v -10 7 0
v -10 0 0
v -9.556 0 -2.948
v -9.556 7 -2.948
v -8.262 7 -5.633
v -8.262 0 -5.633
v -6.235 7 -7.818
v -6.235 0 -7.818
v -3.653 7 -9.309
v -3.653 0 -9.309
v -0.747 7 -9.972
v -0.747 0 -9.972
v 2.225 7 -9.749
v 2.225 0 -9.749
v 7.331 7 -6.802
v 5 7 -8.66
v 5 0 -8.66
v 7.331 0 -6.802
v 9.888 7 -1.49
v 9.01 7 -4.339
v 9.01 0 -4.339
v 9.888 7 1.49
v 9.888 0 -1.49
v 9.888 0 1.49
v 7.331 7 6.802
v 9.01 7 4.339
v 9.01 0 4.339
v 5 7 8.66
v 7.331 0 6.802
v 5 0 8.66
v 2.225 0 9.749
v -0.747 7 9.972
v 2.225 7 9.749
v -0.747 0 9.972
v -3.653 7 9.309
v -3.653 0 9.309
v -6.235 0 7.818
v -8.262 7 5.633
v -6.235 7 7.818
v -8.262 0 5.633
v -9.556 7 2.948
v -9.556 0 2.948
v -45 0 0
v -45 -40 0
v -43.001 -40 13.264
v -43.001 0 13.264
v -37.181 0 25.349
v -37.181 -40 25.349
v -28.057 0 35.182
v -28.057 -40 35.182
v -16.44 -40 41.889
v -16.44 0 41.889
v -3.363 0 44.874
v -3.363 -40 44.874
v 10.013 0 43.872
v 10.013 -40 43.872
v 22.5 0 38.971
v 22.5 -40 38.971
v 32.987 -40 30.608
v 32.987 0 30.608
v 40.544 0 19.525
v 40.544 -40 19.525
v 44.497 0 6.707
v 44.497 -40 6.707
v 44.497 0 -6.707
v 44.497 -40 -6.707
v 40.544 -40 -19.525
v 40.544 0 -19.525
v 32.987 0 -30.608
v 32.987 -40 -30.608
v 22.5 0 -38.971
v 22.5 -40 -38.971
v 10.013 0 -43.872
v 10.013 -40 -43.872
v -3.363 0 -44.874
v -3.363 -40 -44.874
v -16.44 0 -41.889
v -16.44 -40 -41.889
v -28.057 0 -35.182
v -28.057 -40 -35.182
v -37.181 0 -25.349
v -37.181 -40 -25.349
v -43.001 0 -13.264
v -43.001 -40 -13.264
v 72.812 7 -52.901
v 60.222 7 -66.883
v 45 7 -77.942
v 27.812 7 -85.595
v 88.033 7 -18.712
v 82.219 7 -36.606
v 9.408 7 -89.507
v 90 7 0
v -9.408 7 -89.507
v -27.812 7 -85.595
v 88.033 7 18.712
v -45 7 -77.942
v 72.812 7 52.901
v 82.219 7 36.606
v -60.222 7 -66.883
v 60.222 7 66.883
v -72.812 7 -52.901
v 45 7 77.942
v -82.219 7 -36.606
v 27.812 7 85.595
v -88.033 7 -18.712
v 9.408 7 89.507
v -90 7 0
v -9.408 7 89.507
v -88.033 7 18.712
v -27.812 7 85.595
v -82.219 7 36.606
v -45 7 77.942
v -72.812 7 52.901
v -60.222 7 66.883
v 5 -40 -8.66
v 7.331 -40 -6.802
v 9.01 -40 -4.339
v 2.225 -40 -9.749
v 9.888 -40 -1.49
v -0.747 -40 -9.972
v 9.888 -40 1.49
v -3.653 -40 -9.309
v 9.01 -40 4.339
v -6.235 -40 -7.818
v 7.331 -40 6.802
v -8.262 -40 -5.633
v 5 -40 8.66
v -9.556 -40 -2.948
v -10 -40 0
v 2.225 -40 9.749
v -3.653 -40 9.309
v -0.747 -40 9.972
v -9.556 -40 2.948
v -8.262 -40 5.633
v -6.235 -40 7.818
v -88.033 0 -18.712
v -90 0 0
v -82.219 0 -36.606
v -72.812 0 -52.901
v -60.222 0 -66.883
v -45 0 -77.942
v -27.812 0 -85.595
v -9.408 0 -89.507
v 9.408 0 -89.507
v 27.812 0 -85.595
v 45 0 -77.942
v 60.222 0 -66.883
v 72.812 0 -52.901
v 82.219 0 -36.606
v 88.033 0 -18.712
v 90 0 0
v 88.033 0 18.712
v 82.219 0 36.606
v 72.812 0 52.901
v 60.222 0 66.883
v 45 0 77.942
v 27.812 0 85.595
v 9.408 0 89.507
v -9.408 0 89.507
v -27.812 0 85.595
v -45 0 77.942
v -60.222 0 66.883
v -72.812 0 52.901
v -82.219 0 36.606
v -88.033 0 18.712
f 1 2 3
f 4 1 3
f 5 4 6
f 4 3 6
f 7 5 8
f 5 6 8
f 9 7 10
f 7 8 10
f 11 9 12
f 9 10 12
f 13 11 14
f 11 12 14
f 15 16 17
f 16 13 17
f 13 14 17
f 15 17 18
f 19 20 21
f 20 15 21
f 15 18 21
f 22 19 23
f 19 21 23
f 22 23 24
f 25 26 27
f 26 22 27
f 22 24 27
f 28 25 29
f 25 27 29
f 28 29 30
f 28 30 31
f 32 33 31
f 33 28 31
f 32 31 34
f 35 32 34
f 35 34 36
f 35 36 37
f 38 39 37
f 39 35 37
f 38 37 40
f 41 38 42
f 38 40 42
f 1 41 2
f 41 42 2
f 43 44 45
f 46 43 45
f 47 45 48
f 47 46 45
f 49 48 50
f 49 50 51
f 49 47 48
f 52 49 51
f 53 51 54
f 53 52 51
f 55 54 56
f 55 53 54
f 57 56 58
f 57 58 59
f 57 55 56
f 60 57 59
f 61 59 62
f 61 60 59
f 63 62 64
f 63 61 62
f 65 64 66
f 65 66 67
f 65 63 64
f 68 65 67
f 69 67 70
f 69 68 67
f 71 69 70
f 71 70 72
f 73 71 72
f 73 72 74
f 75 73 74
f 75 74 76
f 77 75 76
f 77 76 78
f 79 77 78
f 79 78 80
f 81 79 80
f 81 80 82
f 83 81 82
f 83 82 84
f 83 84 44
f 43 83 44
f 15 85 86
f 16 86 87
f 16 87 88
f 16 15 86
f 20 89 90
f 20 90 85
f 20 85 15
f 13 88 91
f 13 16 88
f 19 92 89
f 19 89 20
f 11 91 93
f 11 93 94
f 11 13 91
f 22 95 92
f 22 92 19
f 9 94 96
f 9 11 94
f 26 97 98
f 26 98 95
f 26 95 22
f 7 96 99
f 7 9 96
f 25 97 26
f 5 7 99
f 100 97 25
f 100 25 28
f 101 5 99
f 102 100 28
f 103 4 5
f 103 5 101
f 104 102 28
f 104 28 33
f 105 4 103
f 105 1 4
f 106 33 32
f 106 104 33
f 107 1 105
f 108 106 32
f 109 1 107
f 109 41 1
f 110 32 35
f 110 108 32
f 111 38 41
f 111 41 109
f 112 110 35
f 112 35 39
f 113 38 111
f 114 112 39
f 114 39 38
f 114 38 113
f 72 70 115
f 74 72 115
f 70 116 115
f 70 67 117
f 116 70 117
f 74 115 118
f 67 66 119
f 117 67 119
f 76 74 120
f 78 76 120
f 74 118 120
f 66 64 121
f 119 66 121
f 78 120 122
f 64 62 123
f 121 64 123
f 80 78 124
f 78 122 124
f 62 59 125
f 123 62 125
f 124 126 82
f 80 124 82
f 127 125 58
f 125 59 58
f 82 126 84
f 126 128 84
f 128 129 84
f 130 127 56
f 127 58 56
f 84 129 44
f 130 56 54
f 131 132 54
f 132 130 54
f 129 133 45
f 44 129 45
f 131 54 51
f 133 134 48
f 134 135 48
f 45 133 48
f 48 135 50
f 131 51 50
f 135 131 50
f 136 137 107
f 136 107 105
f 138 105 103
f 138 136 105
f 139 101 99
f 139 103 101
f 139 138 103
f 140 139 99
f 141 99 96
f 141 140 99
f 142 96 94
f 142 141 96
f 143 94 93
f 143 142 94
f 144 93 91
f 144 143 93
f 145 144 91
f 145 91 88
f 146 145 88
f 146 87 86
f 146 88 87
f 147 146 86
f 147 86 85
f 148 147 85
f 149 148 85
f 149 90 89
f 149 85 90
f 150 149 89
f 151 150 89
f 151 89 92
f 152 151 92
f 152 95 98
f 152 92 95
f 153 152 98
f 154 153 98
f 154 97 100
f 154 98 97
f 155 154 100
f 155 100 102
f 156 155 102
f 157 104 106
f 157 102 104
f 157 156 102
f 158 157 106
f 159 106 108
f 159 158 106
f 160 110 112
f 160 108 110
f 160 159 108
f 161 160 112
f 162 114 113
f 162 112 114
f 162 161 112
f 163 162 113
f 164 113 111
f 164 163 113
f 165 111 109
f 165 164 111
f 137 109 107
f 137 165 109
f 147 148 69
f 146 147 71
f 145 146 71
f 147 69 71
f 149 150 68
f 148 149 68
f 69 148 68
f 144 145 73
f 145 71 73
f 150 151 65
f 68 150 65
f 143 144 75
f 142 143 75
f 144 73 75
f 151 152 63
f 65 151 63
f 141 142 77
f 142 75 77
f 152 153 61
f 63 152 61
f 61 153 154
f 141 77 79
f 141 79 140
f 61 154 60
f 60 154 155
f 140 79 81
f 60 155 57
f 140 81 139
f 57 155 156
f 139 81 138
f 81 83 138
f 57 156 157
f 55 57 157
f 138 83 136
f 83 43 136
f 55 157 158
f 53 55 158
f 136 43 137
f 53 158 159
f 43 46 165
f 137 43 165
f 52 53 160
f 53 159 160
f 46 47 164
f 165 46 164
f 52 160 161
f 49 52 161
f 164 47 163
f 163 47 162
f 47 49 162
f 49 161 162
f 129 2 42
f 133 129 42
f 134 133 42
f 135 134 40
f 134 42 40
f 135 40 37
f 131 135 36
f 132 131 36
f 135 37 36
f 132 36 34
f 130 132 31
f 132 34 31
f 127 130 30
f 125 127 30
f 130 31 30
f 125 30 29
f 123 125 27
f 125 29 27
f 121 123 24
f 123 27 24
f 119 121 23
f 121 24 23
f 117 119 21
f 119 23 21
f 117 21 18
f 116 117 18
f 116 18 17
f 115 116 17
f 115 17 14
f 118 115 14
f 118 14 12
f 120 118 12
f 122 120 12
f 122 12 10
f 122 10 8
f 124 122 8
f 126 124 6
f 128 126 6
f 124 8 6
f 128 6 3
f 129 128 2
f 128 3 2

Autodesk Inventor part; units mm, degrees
ref_plane "YZ Plane" through (0, 0, 0) normal (1, 0, 0) x (0, 1, 0)
ref_plane "XZ Plane" through (0, 0, 0) normal (0, 1, 0) x (-1, 0, 0)
ref_plane "XY Plane" through (0, 0, 0) normal (0, 0, 1) x (1, 0, 0)
sketch "Sketch1" plane through (0, 0, 0) normal (0, 1, 0) x (-1, 0, 0)
  circle A0 centre (0, 0) radius 90
  circle A1 centre (0, 0) radius 45
  circle A2 centre (0, 0) radius 10
  dimension "d0" = 180
  dimension "d1" = 90
  dimension "d2" = 20
extrude "Extrusion1" add sketch "Sketch1" along normal blind 7 contours A0 | A1
extrude "Extrusion2" add sketch "Sketch1" against normal blind 40 contours A1
properties part number "56T-Sprocket"
